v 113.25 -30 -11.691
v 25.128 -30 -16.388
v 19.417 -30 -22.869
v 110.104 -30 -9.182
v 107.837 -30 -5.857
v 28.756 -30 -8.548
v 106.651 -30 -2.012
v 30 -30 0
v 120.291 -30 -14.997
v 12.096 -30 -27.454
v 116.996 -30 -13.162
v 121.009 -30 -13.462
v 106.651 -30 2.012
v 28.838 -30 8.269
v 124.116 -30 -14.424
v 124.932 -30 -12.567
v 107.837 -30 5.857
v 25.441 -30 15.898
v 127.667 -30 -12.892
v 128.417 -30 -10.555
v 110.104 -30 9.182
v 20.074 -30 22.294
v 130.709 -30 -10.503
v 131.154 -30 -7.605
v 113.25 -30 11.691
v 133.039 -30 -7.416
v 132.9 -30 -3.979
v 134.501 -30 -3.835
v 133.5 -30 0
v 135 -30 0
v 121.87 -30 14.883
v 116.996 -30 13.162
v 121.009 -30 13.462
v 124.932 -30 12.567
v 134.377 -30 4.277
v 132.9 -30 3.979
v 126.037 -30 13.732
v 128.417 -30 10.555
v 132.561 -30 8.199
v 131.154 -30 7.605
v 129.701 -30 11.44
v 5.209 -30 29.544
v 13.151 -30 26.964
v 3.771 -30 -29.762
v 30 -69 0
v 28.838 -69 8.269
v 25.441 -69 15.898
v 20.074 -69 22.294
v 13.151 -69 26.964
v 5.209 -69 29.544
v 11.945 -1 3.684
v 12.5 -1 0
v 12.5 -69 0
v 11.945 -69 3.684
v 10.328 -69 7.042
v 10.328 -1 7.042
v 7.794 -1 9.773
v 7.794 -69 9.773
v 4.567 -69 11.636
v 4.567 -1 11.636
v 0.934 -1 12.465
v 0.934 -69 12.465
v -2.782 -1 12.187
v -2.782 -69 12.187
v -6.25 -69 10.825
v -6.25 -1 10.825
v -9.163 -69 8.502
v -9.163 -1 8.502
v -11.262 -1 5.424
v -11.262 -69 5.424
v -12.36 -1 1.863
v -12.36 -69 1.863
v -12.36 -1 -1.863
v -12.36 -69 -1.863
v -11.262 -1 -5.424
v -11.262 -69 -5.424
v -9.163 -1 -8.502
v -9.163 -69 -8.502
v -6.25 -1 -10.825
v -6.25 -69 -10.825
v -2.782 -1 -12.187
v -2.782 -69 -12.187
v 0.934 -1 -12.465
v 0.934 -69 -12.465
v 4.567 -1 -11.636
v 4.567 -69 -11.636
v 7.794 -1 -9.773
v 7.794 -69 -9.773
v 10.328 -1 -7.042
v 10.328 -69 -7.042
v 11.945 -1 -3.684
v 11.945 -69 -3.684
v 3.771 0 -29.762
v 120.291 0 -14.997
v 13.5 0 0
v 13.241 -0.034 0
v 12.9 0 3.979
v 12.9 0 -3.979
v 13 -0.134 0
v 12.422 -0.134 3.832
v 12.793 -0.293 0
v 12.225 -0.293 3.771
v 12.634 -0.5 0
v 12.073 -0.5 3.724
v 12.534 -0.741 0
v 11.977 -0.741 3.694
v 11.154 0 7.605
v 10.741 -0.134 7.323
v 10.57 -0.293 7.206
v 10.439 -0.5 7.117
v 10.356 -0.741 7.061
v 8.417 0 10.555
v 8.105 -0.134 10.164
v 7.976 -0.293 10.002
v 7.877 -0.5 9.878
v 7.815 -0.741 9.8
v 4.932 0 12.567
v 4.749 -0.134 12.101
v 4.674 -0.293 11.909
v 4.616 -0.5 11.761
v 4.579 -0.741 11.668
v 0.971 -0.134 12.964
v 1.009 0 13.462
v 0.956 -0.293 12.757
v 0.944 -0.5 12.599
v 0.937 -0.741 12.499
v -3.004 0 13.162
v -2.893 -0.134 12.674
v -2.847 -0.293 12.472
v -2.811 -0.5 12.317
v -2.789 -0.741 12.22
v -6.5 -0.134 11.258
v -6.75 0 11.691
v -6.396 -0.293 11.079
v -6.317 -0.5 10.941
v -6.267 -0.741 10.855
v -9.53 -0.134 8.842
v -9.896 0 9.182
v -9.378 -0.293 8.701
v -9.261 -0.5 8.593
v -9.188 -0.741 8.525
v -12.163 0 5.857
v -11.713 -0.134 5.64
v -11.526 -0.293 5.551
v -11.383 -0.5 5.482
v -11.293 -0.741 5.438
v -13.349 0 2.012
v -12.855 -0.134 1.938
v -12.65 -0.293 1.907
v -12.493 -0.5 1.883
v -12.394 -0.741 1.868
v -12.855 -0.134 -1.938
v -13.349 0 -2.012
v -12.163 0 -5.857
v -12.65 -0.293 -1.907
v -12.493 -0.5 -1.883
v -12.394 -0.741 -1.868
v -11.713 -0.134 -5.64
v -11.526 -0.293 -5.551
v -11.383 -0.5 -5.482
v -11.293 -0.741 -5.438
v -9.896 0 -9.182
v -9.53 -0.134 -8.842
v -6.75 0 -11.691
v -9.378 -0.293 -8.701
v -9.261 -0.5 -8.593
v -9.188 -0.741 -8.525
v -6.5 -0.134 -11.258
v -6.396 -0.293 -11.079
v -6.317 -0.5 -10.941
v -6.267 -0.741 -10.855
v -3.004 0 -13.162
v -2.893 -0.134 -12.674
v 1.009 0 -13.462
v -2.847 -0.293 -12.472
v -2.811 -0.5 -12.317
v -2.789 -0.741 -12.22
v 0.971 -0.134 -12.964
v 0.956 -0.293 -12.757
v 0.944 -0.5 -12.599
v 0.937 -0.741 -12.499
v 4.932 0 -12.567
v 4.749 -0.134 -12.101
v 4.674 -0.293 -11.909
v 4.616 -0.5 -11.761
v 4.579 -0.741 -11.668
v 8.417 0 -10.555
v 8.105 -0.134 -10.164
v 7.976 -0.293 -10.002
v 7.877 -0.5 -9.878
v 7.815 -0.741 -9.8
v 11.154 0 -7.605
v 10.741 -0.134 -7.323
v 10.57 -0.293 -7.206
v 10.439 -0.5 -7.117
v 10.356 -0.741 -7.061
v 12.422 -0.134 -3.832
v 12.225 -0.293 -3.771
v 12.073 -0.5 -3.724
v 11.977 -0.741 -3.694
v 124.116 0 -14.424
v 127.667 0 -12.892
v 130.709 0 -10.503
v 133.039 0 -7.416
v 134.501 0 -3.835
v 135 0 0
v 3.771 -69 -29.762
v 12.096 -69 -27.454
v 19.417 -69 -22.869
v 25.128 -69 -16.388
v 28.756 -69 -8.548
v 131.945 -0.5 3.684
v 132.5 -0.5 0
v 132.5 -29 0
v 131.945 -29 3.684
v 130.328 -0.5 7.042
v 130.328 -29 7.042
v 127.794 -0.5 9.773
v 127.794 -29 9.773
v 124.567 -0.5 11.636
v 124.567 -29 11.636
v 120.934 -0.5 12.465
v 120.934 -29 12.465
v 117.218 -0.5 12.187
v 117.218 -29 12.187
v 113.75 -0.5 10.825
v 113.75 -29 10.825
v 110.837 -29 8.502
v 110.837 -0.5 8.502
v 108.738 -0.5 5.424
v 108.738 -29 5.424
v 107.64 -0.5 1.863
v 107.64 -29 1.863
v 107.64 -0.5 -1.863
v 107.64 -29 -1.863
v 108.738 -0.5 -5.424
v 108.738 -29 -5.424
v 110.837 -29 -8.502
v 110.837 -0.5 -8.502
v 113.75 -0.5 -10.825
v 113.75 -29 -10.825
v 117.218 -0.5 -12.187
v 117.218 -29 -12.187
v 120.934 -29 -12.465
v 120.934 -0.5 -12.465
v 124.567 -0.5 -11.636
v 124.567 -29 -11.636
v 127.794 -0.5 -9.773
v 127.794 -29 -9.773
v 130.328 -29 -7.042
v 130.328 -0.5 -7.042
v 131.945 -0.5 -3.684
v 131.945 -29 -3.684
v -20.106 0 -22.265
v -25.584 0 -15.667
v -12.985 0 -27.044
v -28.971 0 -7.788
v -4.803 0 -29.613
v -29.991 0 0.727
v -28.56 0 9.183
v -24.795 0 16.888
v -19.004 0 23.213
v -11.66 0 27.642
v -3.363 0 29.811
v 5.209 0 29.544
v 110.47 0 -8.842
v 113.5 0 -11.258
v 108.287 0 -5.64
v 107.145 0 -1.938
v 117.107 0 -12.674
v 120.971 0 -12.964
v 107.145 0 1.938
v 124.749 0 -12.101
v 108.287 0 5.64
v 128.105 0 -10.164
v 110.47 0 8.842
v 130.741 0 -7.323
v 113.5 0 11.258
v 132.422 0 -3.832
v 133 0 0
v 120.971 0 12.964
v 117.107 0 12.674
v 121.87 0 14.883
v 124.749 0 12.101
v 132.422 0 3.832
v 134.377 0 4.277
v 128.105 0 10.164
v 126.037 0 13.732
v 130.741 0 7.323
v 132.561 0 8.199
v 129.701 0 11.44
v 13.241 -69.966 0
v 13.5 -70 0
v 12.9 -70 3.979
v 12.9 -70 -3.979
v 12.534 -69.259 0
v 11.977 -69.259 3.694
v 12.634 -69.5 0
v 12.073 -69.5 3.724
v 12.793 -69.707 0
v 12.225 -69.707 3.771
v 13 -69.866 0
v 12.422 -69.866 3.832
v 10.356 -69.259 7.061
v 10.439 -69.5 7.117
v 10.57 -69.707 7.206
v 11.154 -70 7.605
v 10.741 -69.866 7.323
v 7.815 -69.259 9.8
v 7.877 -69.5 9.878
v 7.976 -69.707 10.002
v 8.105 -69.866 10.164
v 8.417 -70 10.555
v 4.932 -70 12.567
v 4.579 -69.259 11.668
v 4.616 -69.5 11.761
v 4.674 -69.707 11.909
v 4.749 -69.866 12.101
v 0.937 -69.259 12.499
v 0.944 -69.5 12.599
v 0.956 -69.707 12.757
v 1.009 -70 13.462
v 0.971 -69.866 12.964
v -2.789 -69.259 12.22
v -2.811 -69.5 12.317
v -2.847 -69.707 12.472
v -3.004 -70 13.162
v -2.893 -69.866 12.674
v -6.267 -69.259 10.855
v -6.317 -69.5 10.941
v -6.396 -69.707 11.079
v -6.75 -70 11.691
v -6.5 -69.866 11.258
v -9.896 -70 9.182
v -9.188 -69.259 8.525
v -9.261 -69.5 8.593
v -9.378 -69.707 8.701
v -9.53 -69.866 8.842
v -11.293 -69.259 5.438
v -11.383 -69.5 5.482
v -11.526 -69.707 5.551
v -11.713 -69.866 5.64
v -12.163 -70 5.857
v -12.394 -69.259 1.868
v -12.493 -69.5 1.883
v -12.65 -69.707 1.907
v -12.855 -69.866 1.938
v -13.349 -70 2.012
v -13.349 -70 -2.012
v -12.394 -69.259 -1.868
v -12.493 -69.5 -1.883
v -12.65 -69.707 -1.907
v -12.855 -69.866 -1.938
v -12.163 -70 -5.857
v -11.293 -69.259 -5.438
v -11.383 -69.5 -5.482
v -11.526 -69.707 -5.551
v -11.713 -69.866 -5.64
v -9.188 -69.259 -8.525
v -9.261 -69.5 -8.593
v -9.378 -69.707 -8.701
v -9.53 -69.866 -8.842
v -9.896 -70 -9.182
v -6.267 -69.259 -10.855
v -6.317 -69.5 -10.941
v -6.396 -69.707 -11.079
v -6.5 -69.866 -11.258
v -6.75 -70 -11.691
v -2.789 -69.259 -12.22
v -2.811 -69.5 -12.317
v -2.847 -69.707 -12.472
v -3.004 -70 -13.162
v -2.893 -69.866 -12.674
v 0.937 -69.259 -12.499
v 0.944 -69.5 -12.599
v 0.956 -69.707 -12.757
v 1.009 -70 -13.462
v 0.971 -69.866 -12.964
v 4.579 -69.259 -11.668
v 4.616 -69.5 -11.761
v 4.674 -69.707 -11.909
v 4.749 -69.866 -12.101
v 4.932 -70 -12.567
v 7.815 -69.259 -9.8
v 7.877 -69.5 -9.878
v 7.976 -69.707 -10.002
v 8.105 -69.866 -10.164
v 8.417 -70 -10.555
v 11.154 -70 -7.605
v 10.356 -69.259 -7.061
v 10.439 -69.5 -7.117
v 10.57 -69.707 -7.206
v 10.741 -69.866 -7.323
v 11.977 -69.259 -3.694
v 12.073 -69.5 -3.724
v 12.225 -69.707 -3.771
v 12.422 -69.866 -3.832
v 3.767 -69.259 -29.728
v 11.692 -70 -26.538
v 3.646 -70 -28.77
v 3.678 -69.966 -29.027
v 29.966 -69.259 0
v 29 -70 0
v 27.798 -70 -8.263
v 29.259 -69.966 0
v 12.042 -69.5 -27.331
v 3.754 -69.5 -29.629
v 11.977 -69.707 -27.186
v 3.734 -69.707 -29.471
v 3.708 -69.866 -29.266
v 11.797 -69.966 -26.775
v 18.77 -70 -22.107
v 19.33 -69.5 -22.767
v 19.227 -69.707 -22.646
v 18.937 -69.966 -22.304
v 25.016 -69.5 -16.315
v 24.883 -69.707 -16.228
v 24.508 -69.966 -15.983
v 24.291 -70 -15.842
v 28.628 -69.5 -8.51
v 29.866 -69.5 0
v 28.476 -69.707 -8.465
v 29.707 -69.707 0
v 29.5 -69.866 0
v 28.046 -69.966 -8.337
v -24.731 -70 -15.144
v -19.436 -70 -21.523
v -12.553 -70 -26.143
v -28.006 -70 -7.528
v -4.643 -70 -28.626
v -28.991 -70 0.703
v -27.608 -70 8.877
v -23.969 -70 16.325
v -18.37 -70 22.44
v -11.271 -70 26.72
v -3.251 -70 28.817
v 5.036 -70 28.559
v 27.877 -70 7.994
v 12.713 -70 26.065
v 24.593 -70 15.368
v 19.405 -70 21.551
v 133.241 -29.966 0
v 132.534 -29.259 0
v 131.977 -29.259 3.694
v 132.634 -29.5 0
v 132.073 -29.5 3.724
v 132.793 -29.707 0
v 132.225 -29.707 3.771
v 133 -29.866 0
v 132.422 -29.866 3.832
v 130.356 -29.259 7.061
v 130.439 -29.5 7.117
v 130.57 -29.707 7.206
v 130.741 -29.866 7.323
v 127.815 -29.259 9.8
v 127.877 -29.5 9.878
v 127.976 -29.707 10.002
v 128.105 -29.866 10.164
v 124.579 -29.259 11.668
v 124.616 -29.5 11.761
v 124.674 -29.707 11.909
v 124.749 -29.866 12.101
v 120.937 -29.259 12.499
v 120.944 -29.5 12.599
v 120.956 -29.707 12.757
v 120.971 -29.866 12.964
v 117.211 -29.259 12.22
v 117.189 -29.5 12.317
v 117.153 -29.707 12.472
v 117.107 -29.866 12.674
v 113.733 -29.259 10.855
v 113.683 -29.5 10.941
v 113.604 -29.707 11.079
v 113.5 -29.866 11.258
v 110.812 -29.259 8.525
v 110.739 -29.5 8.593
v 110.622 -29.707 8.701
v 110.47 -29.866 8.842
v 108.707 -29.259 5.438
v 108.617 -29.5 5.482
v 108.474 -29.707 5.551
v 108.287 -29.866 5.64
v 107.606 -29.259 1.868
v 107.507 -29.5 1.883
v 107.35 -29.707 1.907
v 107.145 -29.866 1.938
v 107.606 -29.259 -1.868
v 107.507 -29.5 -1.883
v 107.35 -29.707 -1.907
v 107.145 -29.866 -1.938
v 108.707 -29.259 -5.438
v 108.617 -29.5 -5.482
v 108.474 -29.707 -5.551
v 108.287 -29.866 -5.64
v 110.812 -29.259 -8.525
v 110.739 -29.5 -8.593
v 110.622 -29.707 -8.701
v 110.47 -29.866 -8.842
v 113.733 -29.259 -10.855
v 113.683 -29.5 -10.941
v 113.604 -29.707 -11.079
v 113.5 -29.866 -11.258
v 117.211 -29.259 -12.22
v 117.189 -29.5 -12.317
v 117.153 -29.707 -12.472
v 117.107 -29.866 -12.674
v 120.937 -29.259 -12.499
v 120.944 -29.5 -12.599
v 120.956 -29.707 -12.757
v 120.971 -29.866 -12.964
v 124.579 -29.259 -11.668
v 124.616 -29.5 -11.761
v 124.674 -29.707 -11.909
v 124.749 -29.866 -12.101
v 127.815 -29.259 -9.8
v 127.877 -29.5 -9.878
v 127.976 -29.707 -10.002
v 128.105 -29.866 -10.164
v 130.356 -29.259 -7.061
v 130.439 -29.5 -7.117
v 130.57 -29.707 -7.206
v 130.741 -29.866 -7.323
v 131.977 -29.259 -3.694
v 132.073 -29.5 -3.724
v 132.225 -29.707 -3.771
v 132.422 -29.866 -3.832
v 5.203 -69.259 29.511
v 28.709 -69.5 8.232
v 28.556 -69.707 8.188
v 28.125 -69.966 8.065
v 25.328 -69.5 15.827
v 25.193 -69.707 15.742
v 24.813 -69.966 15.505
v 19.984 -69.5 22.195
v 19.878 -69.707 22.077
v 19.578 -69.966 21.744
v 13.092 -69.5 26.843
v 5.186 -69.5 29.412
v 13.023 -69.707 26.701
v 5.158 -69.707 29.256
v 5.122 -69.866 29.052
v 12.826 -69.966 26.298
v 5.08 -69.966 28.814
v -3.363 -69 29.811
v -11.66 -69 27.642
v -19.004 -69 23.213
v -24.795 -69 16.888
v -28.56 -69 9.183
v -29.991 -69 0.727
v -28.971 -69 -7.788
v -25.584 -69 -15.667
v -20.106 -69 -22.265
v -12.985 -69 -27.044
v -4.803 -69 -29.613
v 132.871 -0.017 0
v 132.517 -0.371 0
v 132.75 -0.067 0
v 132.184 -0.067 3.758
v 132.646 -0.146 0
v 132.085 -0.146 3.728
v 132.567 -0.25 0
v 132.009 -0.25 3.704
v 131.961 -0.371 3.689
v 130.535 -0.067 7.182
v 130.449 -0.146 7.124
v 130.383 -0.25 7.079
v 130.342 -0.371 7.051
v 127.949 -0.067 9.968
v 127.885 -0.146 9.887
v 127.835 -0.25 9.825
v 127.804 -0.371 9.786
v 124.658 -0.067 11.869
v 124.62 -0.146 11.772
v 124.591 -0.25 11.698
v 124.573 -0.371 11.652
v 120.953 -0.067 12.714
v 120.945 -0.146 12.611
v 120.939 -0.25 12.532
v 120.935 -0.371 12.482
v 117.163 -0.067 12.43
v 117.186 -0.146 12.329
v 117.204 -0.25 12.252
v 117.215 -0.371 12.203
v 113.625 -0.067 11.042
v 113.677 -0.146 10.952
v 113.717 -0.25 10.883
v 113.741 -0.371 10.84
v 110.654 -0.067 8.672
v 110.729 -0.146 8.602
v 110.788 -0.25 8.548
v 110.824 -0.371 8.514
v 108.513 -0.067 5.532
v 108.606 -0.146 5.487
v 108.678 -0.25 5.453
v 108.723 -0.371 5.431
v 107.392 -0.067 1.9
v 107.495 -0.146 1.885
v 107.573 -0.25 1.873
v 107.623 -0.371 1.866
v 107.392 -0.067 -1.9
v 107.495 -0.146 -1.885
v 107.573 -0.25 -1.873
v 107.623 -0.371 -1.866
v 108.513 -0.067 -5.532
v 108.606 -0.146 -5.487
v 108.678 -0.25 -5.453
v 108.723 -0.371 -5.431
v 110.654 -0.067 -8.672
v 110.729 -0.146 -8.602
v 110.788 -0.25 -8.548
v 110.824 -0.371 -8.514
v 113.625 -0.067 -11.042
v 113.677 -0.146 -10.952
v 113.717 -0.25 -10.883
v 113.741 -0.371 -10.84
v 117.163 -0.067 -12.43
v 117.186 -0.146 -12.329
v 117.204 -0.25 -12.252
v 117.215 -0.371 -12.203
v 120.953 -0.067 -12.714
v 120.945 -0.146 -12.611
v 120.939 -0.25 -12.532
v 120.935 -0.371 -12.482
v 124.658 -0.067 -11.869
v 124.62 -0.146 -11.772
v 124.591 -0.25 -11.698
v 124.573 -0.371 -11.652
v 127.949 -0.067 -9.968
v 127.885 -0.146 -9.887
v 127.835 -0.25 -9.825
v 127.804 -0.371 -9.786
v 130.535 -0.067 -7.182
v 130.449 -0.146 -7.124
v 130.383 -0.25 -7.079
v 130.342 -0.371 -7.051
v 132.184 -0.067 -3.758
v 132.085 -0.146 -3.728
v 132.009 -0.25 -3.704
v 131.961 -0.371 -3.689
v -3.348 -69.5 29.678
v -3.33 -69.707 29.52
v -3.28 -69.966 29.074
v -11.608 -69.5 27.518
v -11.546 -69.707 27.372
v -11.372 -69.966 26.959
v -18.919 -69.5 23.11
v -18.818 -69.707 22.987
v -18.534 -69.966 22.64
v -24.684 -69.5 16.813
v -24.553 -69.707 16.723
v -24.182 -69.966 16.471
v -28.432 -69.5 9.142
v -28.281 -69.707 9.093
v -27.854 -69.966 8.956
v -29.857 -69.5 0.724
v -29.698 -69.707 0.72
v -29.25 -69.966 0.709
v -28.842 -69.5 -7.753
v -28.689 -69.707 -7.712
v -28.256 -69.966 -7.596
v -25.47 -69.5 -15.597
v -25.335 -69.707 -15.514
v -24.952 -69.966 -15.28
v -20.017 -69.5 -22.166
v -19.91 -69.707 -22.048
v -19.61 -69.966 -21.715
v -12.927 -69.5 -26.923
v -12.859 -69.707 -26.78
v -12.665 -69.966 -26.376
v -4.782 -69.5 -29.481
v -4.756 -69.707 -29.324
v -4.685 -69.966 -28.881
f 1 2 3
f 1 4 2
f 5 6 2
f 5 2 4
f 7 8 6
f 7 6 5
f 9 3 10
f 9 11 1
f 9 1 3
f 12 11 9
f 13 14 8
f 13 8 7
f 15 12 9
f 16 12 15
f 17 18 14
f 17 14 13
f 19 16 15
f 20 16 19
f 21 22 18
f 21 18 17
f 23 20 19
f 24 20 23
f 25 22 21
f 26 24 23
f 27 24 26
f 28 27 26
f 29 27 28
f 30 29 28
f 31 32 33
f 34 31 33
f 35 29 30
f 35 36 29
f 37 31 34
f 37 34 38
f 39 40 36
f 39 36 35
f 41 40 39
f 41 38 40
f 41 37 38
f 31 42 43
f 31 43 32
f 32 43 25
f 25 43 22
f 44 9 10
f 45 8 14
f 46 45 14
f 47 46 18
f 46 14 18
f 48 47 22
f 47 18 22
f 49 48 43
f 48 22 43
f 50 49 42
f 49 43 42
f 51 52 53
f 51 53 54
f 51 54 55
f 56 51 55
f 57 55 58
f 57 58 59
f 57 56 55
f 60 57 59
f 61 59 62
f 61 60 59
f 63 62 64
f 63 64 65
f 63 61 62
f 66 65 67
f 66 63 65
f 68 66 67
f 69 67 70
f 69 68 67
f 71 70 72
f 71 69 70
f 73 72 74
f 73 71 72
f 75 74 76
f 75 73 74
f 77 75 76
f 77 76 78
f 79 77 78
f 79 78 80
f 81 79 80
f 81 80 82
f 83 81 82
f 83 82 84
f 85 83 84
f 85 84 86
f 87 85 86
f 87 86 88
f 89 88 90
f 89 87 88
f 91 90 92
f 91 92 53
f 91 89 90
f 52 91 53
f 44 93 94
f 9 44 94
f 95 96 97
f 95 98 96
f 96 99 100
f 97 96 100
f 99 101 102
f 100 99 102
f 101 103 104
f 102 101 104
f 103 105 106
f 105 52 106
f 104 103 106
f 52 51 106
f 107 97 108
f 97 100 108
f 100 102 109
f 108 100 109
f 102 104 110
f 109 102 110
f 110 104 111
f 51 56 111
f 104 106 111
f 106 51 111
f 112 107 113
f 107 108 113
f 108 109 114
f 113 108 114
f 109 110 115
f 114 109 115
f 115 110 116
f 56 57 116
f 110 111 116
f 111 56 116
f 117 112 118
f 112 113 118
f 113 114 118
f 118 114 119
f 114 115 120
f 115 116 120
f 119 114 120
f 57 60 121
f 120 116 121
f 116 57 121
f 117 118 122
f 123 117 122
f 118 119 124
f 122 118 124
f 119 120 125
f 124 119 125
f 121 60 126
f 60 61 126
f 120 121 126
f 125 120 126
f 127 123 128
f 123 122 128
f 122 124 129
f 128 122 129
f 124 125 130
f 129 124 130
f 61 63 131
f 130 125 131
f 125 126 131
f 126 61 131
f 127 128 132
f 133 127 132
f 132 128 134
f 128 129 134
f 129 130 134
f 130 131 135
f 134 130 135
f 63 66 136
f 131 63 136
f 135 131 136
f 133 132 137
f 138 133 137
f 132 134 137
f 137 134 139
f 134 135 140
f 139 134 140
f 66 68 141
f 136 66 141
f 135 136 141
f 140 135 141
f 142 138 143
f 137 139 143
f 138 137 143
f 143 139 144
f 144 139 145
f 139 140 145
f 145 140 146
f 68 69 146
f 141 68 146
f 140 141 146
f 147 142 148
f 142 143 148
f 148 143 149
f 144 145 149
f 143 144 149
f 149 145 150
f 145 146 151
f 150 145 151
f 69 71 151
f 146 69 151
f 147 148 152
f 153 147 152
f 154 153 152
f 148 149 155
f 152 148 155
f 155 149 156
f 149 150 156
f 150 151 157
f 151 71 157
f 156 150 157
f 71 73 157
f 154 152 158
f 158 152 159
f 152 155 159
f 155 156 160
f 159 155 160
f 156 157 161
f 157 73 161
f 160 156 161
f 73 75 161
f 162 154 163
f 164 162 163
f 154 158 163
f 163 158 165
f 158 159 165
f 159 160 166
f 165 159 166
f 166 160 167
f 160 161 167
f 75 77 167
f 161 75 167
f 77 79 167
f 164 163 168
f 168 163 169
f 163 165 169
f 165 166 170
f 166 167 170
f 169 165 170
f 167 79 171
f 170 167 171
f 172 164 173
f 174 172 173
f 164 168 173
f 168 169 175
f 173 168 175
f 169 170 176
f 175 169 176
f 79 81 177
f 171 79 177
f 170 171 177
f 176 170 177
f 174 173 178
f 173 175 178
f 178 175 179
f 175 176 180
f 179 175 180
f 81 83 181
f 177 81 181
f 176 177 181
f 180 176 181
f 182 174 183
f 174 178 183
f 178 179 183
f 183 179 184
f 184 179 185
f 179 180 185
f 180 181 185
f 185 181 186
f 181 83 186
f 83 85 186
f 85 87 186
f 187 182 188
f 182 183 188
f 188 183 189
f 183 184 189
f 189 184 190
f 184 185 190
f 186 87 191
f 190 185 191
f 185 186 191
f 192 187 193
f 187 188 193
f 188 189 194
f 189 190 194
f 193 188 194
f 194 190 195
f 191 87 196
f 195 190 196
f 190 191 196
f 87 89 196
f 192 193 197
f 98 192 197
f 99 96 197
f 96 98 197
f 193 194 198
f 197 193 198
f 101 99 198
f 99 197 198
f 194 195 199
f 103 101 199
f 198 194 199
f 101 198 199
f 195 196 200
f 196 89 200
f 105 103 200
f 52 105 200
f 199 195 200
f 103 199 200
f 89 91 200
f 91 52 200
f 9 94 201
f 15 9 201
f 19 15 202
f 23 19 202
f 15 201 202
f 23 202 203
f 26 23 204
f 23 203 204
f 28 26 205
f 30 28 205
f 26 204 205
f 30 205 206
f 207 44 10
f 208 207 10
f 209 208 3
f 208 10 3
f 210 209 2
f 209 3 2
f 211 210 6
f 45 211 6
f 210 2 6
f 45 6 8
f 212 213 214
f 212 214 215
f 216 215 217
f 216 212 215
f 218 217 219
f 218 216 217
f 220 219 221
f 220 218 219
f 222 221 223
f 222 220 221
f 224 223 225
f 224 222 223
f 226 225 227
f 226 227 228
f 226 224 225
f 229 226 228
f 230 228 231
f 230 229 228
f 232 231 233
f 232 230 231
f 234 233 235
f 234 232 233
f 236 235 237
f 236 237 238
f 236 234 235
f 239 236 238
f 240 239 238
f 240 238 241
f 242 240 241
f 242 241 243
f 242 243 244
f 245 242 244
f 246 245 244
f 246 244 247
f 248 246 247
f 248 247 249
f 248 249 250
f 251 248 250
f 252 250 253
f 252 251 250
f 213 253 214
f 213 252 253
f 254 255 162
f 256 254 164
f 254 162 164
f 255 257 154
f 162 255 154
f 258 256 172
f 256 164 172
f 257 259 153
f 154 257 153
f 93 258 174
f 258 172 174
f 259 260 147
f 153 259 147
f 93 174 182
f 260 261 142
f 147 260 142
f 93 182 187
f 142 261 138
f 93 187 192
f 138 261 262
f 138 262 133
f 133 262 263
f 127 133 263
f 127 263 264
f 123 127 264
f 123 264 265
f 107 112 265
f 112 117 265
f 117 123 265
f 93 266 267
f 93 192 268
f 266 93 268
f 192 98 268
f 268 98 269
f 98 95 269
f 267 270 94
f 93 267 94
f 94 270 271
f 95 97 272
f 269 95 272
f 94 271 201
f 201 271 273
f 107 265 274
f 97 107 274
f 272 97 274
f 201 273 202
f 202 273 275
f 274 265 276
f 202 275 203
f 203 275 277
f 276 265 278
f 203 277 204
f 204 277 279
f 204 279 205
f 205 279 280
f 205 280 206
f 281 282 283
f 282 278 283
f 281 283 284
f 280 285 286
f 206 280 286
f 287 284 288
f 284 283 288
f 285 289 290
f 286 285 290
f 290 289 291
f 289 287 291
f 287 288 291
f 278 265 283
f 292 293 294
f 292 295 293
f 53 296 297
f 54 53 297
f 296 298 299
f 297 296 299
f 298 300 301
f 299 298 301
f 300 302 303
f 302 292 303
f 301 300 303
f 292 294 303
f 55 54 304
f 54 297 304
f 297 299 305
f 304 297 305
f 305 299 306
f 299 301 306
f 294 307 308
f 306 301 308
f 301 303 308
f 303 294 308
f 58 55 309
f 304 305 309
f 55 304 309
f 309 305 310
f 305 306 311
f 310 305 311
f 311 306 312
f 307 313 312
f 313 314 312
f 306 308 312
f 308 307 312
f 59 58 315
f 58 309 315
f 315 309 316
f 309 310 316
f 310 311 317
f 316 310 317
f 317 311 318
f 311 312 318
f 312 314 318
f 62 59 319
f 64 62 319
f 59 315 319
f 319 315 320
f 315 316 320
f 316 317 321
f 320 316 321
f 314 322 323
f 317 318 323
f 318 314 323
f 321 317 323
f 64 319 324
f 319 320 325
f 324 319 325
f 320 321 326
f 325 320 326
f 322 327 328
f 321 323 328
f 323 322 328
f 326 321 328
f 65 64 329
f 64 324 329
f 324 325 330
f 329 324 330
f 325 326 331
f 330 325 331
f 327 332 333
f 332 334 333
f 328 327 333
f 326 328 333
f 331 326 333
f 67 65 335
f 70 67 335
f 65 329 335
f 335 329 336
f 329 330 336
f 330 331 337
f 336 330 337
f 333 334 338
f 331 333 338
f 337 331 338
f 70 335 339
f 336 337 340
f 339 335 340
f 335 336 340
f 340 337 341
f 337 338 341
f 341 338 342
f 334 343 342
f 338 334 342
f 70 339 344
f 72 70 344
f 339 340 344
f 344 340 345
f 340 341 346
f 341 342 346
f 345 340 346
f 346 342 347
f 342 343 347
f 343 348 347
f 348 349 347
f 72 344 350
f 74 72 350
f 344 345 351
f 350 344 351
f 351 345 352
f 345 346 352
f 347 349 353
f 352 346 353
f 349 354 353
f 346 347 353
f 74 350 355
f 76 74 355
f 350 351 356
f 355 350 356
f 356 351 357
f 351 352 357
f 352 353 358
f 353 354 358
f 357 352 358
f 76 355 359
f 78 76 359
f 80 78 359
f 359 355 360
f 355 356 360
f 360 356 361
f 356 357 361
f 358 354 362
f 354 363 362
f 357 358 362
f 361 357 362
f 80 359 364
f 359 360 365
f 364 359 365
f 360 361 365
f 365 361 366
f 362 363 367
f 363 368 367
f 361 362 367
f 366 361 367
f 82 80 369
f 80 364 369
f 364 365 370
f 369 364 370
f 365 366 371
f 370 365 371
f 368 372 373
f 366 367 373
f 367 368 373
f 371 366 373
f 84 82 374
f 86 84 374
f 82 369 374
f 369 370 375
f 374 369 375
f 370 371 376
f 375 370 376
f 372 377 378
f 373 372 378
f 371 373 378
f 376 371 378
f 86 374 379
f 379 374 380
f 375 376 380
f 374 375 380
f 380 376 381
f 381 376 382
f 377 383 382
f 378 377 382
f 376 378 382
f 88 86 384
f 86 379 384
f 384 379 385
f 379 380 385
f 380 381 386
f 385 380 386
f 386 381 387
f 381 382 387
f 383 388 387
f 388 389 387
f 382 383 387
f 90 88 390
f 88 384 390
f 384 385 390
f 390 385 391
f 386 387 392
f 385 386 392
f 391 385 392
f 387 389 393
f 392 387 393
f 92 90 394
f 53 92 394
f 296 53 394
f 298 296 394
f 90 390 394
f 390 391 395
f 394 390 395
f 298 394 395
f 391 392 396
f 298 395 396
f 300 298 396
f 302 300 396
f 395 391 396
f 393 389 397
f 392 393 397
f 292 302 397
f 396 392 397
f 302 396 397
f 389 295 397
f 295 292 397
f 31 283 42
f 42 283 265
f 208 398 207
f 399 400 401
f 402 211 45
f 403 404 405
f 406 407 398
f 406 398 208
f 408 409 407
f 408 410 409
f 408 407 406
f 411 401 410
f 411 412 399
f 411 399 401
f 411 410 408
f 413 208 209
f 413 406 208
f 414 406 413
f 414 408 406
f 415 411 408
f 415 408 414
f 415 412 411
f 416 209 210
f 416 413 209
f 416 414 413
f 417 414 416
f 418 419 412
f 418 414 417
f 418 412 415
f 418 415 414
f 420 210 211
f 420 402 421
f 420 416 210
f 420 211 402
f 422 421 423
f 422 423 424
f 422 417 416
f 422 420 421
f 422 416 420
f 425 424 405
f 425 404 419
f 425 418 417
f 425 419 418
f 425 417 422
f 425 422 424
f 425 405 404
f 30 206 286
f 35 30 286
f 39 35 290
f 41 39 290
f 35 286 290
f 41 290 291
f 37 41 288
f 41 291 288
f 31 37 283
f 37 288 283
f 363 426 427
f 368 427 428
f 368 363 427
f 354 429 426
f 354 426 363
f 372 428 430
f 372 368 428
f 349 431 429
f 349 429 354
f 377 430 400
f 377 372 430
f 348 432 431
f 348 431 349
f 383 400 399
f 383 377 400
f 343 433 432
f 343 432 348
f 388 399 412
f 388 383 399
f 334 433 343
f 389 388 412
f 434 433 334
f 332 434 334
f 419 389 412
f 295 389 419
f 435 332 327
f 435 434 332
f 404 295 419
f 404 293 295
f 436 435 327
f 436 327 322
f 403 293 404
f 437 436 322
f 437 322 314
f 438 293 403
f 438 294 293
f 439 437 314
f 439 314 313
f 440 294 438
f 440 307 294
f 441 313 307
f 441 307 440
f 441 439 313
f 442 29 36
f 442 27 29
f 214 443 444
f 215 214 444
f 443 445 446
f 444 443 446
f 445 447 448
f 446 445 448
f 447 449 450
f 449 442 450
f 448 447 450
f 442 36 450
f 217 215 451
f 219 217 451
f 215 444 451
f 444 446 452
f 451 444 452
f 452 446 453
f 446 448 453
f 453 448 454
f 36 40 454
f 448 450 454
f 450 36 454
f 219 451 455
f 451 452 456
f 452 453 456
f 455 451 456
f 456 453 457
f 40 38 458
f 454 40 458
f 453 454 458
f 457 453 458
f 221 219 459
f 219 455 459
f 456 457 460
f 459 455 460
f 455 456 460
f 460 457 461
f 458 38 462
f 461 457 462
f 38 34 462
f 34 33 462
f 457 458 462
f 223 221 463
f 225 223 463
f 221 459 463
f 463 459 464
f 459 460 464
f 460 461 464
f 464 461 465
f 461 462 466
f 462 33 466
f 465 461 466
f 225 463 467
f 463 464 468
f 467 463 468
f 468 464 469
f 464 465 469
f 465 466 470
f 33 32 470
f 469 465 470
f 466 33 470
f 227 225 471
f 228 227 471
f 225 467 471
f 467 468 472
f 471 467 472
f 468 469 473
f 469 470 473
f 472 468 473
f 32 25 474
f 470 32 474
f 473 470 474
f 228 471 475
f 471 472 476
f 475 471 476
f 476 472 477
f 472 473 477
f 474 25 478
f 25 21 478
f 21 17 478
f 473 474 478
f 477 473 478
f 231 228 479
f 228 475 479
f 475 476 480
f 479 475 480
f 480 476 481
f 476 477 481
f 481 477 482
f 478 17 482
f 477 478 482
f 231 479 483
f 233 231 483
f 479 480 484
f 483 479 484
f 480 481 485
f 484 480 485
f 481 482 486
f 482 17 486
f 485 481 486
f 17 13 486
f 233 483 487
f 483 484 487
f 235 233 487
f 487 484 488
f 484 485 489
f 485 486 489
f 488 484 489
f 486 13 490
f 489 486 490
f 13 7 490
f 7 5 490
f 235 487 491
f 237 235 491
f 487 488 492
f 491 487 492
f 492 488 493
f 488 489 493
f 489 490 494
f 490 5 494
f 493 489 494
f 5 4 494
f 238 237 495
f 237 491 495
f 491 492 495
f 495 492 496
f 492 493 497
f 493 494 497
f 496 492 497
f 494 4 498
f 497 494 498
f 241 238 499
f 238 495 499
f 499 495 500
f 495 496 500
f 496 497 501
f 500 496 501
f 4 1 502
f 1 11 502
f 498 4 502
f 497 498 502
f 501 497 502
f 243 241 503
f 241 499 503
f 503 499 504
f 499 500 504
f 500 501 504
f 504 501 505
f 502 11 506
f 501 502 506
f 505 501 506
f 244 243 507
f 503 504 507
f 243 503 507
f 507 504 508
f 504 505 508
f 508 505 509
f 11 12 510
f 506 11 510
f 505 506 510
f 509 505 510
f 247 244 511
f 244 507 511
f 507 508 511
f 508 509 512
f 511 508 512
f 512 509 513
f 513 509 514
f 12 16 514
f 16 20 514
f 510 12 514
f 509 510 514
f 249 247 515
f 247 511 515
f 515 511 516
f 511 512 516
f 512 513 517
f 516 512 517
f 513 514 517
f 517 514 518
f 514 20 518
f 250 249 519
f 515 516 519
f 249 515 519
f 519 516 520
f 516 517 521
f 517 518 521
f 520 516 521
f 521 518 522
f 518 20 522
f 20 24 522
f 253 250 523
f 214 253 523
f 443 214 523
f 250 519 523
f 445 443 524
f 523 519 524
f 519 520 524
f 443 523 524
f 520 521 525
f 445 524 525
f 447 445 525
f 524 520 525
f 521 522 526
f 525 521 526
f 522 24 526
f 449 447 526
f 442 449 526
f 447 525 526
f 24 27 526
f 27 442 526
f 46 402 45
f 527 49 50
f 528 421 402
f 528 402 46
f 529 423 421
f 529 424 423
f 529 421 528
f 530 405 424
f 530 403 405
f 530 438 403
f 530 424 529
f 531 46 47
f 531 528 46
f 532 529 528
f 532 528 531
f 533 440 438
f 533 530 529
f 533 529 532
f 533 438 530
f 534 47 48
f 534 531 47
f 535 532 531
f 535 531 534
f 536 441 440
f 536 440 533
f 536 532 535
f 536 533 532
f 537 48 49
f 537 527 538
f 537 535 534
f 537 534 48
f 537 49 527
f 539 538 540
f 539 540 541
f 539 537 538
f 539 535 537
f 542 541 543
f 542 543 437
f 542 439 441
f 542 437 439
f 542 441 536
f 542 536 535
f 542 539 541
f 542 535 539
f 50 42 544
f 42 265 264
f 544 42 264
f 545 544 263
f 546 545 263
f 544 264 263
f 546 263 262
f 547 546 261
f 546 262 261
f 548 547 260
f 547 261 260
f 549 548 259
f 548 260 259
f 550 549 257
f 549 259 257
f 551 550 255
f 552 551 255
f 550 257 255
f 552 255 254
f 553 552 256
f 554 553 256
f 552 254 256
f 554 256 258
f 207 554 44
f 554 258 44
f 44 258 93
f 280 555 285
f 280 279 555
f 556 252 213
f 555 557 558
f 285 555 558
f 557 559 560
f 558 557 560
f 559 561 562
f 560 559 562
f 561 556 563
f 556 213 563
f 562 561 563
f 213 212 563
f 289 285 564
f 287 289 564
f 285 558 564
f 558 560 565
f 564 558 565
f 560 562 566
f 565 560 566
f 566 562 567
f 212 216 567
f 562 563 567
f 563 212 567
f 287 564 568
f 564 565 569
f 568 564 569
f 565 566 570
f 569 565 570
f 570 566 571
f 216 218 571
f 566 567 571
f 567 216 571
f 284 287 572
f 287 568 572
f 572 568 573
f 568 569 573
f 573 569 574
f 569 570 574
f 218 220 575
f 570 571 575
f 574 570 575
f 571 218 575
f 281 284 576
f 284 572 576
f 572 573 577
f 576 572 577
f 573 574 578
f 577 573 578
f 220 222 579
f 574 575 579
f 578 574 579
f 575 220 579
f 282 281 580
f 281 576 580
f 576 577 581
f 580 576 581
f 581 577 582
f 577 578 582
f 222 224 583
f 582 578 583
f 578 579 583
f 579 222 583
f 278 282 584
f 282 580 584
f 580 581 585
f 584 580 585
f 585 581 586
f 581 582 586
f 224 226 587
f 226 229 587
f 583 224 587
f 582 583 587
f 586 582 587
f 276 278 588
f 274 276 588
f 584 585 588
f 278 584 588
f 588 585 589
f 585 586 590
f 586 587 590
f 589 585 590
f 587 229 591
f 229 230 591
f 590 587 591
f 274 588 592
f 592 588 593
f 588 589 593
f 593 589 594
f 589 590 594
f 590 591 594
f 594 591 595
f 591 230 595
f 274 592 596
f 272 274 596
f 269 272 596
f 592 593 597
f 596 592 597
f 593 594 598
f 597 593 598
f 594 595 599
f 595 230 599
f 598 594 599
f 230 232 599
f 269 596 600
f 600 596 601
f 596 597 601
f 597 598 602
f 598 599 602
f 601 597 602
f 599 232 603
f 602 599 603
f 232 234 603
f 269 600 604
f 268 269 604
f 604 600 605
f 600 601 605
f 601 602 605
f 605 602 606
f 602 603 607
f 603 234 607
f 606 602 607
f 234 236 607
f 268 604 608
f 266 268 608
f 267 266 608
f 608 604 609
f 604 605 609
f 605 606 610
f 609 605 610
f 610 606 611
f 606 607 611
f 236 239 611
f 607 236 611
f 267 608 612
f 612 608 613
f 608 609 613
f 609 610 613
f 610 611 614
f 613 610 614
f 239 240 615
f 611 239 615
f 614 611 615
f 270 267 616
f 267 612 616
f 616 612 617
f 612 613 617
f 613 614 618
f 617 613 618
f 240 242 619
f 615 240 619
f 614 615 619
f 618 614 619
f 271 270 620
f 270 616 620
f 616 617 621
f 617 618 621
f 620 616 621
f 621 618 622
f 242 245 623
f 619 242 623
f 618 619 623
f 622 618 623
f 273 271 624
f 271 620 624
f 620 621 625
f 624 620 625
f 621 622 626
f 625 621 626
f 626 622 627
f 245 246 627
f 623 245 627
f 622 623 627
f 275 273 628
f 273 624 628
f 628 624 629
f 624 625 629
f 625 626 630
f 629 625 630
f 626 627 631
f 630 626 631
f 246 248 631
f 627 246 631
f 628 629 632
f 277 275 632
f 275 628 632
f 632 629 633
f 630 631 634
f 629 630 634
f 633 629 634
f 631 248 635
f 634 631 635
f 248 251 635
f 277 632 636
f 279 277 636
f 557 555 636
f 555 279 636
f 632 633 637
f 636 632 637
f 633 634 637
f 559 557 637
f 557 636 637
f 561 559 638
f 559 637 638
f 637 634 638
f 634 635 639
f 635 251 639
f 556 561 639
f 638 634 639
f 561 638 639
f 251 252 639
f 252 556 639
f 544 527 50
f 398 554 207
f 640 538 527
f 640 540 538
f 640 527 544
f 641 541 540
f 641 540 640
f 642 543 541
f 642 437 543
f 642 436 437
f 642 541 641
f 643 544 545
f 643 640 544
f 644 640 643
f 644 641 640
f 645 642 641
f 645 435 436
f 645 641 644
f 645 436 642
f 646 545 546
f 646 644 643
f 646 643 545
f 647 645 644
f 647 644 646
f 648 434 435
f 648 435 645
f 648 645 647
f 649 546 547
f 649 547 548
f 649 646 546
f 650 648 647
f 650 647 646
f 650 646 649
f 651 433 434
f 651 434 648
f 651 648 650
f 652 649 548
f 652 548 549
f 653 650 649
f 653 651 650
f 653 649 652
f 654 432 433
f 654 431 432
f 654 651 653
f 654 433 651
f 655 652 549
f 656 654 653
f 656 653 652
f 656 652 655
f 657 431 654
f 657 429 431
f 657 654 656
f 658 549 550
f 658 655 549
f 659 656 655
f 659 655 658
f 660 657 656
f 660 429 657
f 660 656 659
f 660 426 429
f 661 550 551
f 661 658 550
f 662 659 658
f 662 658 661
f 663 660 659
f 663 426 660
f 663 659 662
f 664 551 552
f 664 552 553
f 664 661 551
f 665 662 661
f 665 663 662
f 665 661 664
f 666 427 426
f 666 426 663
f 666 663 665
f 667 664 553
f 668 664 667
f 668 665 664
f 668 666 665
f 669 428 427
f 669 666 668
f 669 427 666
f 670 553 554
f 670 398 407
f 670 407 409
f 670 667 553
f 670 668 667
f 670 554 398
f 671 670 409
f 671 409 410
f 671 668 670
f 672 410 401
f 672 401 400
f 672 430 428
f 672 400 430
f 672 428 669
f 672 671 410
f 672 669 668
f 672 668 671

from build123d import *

# Parameters (mm, degrees)
F0_R     = 12.5
F1_DEPTH = 30
F2_DEPTH = 70
F3_R     = 1
F4_R     = 1
F5_R     = 0.5


with BuildPart() as f1:
    # F0 (on Front) → F1 (new body)
    with BuildSketch(Plane.XZ):
        with BuildLine():
            ThreePointArc((3.771303, -29.762011), (22.5071, -19.835081), (30, 0))
            ThreePointArc((30, 0), (22.98125, 19.283727), (5.209191, 29.544277))
            ThreePointArc((5.209191, 29.544277), (-29.991186, 0.72714), (3.771303, -29.762011))
        make_face()
        Circle(F0_R, mode=Mode.SUBTRACT)
        with BuildLine():
            ThreePointArc((5.209191, 29.544277), (22.98125, 19.283727), (30, 0))
            ThreePointArc((30, 0), (22.5071, -19.835081), (3.771303, -29.762011))
            Line((3.771303, -29.762011), (120.291015, -14.997177))
            ThreePointArc((120.291015, -14.997177), (105.020911, 0.791759), (121.870406, 14.882929))
            Line((121.870406, 14.882929), (5.209191, 29.544277))
        make_face()
        with BuildLine():
            ThreePointArc((135, 0), (131.248468, 9.923304), (121.870406, 14.882929))
            ThreePointArc((121.870406, 14.882929), (105.020911, 0.791759), (120.291015, -14.997177))
            ThreePointArc((120.291015, -14.997177), (130.708997, -10.503209), (135, 0))
        make_face()
        with Locations((120, 0)):
            Circle(F0_R, mode=Mode.SUBTRACT)
    extrude(amount=F1_DEPTH)

    # F0 (on Front) → F2 (join)
    with BuildSketch(Plane.XZ):
        with BuildLine():
            ThreePointArc((3.771303, -29.762011), (22.5071, -19.835081), (30, 0))
            ThreePointArc((30, 0), (22.98125, 19.283727), (5.209191, 29.544277))
            ThreePointArc((5.209191, 29.544277), (-29.991186, 0.72714), (3.771303, -29.762011))
        make_face()
        Circle(F0_R, mode=Mode.SUBTRACT)
    extrude(amount=F2_DEPTH)

    # F3
    f3_edges = [f1.edges().sort_by_distance(p)[0] for p in [
        (-3.771303, -70, 29.762011),
        (-12.5, -70, 0),
        (107.5, -30, 0),
    ]]
    fillet(f3_edges, radius=F3_R)

    # F4
    f4_edges = [f1.edges().sort_by_distance(p)[0] for p in [
        (-12.5, 0, 0),
    ]]
    fillet(f4_edges, radius=F4_R)

    # F5
    f5_edges = [f1.edges().sort_by_distance(p)[0] for p in [
        (107.5, 0, 0),
    ]]
    fillet(f5_edges, radius=F5_R)


solid = f1.part
